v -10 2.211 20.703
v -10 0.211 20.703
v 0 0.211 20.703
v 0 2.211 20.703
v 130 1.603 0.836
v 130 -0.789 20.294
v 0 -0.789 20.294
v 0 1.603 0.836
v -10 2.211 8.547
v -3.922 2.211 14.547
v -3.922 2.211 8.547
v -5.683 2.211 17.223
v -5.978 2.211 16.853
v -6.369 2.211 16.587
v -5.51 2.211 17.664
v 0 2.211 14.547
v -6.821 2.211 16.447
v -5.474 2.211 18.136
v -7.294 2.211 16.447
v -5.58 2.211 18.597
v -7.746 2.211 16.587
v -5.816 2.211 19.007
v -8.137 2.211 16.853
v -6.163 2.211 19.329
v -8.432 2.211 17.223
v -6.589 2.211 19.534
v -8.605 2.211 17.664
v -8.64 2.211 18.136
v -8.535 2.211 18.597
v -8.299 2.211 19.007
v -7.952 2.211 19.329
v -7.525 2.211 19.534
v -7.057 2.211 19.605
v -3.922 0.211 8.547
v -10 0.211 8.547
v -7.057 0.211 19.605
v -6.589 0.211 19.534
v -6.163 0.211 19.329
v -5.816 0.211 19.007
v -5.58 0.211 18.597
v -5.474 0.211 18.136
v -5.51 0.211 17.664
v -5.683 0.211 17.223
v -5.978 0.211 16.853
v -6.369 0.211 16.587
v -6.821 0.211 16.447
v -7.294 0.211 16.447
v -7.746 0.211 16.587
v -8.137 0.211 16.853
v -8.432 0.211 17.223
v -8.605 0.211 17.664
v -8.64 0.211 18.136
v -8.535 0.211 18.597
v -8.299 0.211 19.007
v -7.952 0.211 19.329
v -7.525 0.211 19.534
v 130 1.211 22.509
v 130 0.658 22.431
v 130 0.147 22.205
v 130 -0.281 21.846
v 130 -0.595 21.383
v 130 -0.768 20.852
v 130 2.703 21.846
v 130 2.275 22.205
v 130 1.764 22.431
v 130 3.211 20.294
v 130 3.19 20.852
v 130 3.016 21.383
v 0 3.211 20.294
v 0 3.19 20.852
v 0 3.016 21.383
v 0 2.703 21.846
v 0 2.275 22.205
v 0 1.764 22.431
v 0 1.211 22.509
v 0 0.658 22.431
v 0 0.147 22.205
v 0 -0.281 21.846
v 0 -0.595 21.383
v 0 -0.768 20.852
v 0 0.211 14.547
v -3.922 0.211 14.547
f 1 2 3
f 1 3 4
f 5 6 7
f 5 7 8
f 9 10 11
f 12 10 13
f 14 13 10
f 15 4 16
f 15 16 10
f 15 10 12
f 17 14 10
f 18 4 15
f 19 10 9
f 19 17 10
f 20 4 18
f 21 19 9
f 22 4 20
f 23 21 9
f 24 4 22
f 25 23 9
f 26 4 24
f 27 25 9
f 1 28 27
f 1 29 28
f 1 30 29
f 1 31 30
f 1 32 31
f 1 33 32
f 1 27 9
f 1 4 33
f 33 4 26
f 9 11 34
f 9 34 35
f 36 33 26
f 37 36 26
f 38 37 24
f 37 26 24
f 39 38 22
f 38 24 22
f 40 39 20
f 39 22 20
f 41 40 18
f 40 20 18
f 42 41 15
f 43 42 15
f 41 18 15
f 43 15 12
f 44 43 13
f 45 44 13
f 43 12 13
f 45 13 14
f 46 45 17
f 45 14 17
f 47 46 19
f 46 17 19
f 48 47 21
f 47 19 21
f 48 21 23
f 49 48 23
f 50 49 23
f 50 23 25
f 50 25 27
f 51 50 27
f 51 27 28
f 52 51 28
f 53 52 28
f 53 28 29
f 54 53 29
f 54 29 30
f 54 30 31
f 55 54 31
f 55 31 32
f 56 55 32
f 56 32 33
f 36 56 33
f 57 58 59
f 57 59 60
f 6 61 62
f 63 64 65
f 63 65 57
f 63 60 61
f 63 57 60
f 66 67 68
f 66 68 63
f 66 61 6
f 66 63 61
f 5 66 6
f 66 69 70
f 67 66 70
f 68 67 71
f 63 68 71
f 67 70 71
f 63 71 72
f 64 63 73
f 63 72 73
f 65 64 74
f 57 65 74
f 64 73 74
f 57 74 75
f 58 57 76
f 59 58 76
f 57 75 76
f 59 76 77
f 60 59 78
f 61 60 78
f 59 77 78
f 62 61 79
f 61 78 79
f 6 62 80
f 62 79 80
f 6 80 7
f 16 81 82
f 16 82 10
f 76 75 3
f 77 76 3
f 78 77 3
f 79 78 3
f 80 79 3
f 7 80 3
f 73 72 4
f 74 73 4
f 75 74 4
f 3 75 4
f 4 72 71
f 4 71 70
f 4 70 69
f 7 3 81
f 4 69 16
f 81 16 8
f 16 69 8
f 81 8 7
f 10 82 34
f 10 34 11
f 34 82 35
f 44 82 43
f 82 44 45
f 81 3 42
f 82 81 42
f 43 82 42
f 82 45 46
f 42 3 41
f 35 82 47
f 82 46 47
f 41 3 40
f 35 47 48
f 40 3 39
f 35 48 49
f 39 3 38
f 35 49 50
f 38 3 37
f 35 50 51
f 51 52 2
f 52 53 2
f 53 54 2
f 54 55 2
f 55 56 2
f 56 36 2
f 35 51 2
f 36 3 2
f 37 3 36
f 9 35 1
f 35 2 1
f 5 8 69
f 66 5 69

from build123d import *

# Parameters (mm, degrees)
BOSS_EXTRUDE2_DEPTH = 130
SKETCH3_W           = 6.156004655
SKETCH3_H           = 2
BOSS_EXTRUDE3_DEPTH = 10
SKETCH4_W           = 6.077661346
SKETCH4_H           = 2
BOSS_EXTRUDE4_DEPTH = 6
SKETCH5_R           = 1.5875
CUT_EXTRUDE1_DEPTH  = 132.968640925


with BuildPart() as part:
    # Sketch2 → Boss-Extrude2 (new body)
    with BuildSketch(Plane(origin=(0, 0, 0), x_dir=(0, 0, -1), z_dir=(1, 0, 0))):
        with BuildLine():
            Line((-0.835960879, 1.603184904), (-20.29416291, 3.210740854))
            ThreePointArc((-20.29416291, 3.210740854), (-22.509098324, 1.210740854), (-20.29416291, -0.789259146))
            Line((-20.29416291, -0.789259146), (-0.835960879, 1.603184904))
        make_face()
    extrude(amount=BOSS_EXTRUDE2_DEPTH)

    # Sketch3 → Boss-Extrude3 (add)
    with BuildSketch(Plane.ZY):
        with Locations((17.625252135, 1.210740854)):
            Rectangle(SKETCH3_W, SKETCH3_H)
    extrude(amount=BOSS_EXTRUDE3_DEPTH)

    # Sketch4 → Boss-Extrude4 (add)
    with BuildSketch(Plane(origin=(0, 0, 14.547249808), x_dir=(-1, 0, 0), z_dir=(0, 0, -1))):
        with Locations((6.961169327, 1.210740854)):
            Rectangle(SKETCH4_W, SKETCH4_H)
    extrude(amount=BOSS_EXTRUDE4_DEPTH)

    # Sketch5 → Cut-Extrude1 (cut, through all)
    with BuildSketch(Plane(origin=(0, 2.210740854, 0), x_dir=(1, 0, 0), z_dir=(0, 1, 0))):
        with Locations(Location((-7.057411019, -18.017090399, 0), (0, 0, 270))):
            Circle(SKETCH5_R)
    extrude(amount=-CUT_EXTRUDE1_DEPTH, mode=Mode.SUBTRACT)


solid = part.part
